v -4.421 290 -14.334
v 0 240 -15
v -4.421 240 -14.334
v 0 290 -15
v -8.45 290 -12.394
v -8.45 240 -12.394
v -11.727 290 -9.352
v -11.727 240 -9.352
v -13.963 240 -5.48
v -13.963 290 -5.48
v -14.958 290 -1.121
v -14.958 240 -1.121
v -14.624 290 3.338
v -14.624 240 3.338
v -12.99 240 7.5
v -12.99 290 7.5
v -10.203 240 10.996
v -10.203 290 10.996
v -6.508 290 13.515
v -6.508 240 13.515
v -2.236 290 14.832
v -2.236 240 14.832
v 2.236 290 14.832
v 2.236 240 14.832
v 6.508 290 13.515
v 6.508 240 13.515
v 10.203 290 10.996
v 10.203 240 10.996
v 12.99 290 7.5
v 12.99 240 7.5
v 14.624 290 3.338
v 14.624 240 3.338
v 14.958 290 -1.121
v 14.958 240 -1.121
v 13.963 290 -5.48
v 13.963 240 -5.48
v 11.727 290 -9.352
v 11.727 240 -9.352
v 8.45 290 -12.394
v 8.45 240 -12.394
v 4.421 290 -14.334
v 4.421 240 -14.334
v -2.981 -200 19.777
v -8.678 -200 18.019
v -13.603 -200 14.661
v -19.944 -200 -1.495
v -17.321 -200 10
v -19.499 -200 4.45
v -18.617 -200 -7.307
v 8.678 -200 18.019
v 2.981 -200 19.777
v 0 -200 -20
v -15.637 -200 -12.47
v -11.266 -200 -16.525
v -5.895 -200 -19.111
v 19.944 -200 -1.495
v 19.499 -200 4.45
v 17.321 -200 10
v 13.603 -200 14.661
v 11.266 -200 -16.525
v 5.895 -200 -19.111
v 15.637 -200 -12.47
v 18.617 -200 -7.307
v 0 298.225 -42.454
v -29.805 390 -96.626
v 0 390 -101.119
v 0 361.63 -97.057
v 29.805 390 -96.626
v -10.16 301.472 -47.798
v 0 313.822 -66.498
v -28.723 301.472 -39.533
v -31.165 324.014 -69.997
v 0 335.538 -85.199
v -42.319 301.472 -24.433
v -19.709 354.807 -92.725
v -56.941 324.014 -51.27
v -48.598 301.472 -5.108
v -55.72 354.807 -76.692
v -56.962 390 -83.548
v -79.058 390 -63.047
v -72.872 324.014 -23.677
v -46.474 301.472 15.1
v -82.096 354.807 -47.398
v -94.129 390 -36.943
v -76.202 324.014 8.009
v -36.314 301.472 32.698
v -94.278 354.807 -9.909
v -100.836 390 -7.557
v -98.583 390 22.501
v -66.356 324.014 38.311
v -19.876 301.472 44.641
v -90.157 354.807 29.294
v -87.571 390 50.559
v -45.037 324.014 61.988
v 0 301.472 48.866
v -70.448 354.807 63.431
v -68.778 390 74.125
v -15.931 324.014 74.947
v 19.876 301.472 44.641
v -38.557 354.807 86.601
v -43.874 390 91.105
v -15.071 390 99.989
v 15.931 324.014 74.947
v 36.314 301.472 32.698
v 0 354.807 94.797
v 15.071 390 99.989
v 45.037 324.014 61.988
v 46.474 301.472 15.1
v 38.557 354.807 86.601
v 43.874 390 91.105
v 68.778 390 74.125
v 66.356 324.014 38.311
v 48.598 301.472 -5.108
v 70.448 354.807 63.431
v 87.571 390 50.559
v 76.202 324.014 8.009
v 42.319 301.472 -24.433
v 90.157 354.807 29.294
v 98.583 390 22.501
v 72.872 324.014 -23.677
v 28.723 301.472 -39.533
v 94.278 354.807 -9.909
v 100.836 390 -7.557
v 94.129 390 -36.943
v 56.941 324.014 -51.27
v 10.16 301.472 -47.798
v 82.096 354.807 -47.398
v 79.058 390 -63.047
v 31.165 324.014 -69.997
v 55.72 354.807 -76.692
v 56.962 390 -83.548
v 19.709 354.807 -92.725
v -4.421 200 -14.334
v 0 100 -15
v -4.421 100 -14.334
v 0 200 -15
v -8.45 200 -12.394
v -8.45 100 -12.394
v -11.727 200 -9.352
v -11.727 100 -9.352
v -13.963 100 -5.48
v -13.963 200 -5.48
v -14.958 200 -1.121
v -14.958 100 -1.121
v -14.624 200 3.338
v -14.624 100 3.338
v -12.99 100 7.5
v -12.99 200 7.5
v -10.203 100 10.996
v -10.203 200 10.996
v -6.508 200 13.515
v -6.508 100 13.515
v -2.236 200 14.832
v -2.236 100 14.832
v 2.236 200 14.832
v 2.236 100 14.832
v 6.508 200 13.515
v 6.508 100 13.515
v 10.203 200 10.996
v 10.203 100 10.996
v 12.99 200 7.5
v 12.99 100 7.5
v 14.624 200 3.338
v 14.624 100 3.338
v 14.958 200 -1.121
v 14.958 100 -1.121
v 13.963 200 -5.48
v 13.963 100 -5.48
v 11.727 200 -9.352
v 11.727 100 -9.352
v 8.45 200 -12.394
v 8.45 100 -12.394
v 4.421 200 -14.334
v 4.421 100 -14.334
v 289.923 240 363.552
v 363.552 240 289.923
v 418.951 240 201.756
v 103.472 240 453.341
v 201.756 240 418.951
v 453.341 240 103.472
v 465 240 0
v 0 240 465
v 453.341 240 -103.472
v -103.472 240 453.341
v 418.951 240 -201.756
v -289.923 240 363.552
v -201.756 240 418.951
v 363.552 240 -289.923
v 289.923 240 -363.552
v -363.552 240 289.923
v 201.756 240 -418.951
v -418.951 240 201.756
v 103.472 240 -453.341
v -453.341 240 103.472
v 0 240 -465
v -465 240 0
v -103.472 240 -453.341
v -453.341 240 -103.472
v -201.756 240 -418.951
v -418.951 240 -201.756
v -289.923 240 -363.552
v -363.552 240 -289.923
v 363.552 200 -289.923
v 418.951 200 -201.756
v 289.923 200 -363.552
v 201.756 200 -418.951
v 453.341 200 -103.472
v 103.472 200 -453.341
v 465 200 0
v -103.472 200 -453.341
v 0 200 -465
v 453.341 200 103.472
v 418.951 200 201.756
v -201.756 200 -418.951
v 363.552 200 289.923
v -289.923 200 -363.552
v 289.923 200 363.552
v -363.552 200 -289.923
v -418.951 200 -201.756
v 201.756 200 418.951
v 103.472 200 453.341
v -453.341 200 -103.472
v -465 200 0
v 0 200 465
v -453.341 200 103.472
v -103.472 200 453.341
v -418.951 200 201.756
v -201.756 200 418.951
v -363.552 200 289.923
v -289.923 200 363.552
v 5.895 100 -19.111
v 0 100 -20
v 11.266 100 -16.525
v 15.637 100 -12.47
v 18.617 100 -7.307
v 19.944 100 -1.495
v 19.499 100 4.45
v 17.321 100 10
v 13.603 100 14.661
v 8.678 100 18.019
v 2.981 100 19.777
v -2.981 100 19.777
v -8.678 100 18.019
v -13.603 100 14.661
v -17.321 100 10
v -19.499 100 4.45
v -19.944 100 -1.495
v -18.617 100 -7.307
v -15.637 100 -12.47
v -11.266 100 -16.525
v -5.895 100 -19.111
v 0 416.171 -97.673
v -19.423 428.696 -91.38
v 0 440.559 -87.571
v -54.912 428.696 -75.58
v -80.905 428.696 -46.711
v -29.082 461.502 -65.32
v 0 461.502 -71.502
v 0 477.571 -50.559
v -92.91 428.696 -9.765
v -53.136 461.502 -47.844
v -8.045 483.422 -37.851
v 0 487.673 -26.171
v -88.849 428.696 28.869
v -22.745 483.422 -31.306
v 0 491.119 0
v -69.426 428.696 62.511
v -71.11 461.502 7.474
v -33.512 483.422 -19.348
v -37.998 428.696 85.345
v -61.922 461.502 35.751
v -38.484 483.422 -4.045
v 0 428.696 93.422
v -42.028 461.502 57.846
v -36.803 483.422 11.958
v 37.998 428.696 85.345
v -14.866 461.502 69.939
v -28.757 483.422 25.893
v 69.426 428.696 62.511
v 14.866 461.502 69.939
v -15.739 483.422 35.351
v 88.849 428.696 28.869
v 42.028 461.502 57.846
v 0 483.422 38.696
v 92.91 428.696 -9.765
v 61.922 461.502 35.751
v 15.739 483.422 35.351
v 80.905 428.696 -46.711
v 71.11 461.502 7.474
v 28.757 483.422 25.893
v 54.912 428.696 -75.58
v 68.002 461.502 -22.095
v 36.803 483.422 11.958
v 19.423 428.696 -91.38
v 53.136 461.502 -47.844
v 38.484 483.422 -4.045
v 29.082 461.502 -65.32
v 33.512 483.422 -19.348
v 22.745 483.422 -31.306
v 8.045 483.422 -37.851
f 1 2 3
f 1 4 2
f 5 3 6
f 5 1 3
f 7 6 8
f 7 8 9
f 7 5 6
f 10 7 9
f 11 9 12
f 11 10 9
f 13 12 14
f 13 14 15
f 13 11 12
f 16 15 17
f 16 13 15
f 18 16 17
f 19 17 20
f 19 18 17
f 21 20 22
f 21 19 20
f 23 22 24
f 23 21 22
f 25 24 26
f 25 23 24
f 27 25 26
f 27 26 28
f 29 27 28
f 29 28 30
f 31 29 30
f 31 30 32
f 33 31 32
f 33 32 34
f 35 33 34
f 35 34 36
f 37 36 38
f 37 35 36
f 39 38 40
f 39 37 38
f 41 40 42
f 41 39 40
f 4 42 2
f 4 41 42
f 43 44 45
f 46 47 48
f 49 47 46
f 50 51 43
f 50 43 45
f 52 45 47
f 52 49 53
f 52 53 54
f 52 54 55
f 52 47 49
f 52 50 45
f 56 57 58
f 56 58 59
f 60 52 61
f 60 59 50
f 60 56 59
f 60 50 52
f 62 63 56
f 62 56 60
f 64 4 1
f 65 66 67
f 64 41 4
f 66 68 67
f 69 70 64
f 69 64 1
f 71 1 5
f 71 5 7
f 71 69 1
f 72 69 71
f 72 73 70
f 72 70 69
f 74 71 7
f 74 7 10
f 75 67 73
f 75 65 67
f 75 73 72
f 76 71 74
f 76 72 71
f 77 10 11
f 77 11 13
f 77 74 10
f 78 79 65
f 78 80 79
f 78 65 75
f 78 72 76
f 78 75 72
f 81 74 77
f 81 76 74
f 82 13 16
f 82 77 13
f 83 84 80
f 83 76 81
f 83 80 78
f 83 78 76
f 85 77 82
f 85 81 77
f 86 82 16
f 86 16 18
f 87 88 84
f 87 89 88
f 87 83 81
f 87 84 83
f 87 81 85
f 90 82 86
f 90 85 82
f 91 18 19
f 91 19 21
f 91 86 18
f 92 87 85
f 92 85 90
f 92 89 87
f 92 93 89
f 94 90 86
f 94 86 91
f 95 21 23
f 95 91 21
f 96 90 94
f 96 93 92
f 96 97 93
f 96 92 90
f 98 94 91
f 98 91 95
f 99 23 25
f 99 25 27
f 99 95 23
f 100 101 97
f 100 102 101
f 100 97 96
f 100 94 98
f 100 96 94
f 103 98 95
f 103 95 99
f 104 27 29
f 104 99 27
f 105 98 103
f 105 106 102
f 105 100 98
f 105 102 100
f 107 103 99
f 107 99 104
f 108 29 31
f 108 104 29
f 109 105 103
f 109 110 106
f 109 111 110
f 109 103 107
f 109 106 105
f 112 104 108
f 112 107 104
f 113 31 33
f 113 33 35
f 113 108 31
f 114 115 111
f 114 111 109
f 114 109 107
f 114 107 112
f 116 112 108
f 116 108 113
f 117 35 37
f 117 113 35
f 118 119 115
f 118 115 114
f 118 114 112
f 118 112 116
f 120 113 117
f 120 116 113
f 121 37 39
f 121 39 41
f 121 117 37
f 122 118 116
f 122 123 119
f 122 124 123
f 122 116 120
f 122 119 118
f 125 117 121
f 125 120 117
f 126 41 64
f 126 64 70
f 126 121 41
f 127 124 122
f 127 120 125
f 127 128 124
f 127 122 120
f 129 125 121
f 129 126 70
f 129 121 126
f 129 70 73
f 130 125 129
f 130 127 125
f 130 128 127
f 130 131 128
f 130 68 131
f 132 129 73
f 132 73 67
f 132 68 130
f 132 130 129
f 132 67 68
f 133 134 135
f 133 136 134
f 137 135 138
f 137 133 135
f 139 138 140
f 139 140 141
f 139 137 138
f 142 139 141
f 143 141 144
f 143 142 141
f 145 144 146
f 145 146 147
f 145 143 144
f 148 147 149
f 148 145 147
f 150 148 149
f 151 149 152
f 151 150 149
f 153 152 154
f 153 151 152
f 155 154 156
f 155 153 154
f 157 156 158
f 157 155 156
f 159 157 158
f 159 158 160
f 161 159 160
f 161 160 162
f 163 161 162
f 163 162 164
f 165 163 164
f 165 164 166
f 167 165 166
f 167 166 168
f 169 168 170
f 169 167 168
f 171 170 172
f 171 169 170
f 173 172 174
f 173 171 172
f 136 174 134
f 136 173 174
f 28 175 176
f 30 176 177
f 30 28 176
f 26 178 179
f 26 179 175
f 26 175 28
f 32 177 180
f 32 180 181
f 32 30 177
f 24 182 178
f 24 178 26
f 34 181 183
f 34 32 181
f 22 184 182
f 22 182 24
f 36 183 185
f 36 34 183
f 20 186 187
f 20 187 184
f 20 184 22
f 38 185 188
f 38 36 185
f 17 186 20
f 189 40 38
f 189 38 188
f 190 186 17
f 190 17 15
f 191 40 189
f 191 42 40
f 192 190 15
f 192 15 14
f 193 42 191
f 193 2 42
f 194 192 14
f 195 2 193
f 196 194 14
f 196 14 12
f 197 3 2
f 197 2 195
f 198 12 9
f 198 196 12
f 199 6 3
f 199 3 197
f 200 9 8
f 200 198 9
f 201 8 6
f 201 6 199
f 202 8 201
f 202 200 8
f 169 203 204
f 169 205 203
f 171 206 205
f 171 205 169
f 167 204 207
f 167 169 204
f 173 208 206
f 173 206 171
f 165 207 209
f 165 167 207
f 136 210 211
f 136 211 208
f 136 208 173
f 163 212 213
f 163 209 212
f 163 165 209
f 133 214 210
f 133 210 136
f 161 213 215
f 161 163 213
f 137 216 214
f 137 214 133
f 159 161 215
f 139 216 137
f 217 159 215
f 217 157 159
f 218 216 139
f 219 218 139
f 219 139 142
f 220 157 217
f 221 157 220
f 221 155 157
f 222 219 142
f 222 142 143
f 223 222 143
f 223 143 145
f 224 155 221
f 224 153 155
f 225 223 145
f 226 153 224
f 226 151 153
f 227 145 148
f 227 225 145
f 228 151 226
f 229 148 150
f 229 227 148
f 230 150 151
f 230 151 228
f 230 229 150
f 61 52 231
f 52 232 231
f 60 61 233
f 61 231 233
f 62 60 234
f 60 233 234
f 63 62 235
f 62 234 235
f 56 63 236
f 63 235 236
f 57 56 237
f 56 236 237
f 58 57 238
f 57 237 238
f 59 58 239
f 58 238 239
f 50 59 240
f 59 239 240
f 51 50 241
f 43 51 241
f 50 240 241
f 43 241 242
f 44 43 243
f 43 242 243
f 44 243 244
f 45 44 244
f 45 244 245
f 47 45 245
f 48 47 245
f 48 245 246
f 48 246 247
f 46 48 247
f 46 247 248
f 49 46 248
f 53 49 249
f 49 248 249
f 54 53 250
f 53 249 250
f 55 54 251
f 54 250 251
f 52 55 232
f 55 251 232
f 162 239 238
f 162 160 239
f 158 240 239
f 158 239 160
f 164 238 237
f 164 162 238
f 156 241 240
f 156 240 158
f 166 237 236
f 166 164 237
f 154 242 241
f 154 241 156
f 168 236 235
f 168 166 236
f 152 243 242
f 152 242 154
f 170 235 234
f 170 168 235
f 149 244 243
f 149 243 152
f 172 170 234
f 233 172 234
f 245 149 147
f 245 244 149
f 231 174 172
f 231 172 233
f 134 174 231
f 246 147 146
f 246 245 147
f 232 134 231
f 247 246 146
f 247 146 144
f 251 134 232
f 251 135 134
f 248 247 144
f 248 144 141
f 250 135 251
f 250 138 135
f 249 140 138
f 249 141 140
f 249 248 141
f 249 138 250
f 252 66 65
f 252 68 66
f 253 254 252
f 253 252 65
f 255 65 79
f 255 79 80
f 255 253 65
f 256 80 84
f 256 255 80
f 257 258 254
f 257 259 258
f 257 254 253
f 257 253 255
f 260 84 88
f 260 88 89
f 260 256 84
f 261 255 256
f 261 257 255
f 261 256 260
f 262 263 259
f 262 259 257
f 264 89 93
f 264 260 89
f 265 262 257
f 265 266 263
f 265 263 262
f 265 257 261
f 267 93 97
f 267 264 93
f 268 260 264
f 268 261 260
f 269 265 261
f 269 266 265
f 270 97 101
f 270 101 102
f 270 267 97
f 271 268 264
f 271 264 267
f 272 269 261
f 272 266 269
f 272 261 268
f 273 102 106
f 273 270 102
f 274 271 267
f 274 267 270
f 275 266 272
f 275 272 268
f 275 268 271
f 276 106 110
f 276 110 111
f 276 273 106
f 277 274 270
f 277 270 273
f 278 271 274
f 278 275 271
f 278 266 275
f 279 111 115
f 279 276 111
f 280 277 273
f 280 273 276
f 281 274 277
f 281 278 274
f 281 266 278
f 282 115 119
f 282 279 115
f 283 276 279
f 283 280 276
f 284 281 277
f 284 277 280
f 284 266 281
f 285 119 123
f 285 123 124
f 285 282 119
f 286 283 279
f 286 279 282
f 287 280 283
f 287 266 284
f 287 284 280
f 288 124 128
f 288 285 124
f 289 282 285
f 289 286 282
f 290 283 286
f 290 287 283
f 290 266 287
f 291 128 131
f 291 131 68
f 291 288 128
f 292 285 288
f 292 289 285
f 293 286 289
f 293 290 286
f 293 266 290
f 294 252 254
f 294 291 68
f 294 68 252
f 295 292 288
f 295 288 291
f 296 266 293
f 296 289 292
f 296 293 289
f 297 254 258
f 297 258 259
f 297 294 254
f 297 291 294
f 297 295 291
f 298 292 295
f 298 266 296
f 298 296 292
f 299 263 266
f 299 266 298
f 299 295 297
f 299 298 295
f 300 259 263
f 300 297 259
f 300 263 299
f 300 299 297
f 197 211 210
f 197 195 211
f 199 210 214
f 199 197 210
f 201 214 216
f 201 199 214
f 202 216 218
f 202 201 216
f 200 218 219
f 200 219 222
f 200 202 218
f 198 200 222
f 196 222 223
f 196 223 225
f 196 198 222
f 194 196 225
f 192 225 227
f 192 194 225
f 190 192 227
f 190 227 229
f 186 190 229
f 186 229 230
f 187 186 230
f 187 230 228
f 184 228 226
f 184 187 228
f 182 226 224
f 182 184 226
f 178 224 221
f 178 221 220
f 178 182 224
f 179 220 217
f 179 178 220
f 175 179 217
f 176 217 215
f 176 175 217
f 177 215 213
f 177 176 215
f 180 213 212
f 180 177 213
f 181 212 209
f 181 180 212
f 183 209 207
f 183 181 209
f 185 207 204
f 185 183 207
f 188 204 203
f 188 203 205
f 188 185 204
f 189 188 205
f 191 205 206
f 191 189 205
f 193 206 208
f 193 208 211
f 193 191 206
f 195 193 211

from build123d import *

# Parameters (mm, degrees)
SKETCH_2_R      = 20
EXTRUDE_1_DEPTH = 200


with BuildPart() as part:
    # 草图1 → 旋转1 (revolve)
    with BuildSketch(Plane.XY, mode=Mode.PRIVATE) as revolve_1_sk:
        with BuildLine():
            Line((0, 288.881257919), (0, 0))
            Line((0, 0), (20, 0))
            Line((20, 0), (20, 100))
            Line((20, 100), (15, 100))
            Line((15, 100), (15, 200))
            Line((15, 200), (465, 200))
            Line((465, 200), (465, 240))
            Line((465, 240), (15, 240))
            Line((15, 240), (15, 290))
            ThreePointArc((15, 290), (7.520830803, 289.161331306), (0, 288.881257919))
        make_face()
        with BuildLine():
            Line((0, 390), (0, 290))
            Line((0, 290), (15, 290))
            ThreePointArc((15, 290), (76.6217369, 324.014324021), (101.118742081, 390))
            ThreePointArc((101.118742081, 390), (71.50174823, 461.50174823), (0, 491.118742081))
            Line((0, 491.118742081), (0, 390))
        make_face()
        with BuildLine():
            Line((0, 290), (0, 288.881257919))
            ThreePointArc((0, 288.881257919), (7.520830803, 289.161331306), (15, 290))
            Line((15, 290), (0, 290))
        make_face()
    revolve(revolve_1_sk.sketch.rotate(Axis((0, 290, 0), (0, 1, 0)), 90), axis=Axis((0, 290, 0), (0, 1, 0)))

    # 草图2 → 凸台-拉伸1 (add)
    with BuildSketch(Plane.XZ):
        with Locations(Location((0, 0, 0), (0, 0, 270))):
            Circle(SKETCH_2_R)
    extrude(amount=EXTRUDE_1_DEPTH)


solid = part.part
